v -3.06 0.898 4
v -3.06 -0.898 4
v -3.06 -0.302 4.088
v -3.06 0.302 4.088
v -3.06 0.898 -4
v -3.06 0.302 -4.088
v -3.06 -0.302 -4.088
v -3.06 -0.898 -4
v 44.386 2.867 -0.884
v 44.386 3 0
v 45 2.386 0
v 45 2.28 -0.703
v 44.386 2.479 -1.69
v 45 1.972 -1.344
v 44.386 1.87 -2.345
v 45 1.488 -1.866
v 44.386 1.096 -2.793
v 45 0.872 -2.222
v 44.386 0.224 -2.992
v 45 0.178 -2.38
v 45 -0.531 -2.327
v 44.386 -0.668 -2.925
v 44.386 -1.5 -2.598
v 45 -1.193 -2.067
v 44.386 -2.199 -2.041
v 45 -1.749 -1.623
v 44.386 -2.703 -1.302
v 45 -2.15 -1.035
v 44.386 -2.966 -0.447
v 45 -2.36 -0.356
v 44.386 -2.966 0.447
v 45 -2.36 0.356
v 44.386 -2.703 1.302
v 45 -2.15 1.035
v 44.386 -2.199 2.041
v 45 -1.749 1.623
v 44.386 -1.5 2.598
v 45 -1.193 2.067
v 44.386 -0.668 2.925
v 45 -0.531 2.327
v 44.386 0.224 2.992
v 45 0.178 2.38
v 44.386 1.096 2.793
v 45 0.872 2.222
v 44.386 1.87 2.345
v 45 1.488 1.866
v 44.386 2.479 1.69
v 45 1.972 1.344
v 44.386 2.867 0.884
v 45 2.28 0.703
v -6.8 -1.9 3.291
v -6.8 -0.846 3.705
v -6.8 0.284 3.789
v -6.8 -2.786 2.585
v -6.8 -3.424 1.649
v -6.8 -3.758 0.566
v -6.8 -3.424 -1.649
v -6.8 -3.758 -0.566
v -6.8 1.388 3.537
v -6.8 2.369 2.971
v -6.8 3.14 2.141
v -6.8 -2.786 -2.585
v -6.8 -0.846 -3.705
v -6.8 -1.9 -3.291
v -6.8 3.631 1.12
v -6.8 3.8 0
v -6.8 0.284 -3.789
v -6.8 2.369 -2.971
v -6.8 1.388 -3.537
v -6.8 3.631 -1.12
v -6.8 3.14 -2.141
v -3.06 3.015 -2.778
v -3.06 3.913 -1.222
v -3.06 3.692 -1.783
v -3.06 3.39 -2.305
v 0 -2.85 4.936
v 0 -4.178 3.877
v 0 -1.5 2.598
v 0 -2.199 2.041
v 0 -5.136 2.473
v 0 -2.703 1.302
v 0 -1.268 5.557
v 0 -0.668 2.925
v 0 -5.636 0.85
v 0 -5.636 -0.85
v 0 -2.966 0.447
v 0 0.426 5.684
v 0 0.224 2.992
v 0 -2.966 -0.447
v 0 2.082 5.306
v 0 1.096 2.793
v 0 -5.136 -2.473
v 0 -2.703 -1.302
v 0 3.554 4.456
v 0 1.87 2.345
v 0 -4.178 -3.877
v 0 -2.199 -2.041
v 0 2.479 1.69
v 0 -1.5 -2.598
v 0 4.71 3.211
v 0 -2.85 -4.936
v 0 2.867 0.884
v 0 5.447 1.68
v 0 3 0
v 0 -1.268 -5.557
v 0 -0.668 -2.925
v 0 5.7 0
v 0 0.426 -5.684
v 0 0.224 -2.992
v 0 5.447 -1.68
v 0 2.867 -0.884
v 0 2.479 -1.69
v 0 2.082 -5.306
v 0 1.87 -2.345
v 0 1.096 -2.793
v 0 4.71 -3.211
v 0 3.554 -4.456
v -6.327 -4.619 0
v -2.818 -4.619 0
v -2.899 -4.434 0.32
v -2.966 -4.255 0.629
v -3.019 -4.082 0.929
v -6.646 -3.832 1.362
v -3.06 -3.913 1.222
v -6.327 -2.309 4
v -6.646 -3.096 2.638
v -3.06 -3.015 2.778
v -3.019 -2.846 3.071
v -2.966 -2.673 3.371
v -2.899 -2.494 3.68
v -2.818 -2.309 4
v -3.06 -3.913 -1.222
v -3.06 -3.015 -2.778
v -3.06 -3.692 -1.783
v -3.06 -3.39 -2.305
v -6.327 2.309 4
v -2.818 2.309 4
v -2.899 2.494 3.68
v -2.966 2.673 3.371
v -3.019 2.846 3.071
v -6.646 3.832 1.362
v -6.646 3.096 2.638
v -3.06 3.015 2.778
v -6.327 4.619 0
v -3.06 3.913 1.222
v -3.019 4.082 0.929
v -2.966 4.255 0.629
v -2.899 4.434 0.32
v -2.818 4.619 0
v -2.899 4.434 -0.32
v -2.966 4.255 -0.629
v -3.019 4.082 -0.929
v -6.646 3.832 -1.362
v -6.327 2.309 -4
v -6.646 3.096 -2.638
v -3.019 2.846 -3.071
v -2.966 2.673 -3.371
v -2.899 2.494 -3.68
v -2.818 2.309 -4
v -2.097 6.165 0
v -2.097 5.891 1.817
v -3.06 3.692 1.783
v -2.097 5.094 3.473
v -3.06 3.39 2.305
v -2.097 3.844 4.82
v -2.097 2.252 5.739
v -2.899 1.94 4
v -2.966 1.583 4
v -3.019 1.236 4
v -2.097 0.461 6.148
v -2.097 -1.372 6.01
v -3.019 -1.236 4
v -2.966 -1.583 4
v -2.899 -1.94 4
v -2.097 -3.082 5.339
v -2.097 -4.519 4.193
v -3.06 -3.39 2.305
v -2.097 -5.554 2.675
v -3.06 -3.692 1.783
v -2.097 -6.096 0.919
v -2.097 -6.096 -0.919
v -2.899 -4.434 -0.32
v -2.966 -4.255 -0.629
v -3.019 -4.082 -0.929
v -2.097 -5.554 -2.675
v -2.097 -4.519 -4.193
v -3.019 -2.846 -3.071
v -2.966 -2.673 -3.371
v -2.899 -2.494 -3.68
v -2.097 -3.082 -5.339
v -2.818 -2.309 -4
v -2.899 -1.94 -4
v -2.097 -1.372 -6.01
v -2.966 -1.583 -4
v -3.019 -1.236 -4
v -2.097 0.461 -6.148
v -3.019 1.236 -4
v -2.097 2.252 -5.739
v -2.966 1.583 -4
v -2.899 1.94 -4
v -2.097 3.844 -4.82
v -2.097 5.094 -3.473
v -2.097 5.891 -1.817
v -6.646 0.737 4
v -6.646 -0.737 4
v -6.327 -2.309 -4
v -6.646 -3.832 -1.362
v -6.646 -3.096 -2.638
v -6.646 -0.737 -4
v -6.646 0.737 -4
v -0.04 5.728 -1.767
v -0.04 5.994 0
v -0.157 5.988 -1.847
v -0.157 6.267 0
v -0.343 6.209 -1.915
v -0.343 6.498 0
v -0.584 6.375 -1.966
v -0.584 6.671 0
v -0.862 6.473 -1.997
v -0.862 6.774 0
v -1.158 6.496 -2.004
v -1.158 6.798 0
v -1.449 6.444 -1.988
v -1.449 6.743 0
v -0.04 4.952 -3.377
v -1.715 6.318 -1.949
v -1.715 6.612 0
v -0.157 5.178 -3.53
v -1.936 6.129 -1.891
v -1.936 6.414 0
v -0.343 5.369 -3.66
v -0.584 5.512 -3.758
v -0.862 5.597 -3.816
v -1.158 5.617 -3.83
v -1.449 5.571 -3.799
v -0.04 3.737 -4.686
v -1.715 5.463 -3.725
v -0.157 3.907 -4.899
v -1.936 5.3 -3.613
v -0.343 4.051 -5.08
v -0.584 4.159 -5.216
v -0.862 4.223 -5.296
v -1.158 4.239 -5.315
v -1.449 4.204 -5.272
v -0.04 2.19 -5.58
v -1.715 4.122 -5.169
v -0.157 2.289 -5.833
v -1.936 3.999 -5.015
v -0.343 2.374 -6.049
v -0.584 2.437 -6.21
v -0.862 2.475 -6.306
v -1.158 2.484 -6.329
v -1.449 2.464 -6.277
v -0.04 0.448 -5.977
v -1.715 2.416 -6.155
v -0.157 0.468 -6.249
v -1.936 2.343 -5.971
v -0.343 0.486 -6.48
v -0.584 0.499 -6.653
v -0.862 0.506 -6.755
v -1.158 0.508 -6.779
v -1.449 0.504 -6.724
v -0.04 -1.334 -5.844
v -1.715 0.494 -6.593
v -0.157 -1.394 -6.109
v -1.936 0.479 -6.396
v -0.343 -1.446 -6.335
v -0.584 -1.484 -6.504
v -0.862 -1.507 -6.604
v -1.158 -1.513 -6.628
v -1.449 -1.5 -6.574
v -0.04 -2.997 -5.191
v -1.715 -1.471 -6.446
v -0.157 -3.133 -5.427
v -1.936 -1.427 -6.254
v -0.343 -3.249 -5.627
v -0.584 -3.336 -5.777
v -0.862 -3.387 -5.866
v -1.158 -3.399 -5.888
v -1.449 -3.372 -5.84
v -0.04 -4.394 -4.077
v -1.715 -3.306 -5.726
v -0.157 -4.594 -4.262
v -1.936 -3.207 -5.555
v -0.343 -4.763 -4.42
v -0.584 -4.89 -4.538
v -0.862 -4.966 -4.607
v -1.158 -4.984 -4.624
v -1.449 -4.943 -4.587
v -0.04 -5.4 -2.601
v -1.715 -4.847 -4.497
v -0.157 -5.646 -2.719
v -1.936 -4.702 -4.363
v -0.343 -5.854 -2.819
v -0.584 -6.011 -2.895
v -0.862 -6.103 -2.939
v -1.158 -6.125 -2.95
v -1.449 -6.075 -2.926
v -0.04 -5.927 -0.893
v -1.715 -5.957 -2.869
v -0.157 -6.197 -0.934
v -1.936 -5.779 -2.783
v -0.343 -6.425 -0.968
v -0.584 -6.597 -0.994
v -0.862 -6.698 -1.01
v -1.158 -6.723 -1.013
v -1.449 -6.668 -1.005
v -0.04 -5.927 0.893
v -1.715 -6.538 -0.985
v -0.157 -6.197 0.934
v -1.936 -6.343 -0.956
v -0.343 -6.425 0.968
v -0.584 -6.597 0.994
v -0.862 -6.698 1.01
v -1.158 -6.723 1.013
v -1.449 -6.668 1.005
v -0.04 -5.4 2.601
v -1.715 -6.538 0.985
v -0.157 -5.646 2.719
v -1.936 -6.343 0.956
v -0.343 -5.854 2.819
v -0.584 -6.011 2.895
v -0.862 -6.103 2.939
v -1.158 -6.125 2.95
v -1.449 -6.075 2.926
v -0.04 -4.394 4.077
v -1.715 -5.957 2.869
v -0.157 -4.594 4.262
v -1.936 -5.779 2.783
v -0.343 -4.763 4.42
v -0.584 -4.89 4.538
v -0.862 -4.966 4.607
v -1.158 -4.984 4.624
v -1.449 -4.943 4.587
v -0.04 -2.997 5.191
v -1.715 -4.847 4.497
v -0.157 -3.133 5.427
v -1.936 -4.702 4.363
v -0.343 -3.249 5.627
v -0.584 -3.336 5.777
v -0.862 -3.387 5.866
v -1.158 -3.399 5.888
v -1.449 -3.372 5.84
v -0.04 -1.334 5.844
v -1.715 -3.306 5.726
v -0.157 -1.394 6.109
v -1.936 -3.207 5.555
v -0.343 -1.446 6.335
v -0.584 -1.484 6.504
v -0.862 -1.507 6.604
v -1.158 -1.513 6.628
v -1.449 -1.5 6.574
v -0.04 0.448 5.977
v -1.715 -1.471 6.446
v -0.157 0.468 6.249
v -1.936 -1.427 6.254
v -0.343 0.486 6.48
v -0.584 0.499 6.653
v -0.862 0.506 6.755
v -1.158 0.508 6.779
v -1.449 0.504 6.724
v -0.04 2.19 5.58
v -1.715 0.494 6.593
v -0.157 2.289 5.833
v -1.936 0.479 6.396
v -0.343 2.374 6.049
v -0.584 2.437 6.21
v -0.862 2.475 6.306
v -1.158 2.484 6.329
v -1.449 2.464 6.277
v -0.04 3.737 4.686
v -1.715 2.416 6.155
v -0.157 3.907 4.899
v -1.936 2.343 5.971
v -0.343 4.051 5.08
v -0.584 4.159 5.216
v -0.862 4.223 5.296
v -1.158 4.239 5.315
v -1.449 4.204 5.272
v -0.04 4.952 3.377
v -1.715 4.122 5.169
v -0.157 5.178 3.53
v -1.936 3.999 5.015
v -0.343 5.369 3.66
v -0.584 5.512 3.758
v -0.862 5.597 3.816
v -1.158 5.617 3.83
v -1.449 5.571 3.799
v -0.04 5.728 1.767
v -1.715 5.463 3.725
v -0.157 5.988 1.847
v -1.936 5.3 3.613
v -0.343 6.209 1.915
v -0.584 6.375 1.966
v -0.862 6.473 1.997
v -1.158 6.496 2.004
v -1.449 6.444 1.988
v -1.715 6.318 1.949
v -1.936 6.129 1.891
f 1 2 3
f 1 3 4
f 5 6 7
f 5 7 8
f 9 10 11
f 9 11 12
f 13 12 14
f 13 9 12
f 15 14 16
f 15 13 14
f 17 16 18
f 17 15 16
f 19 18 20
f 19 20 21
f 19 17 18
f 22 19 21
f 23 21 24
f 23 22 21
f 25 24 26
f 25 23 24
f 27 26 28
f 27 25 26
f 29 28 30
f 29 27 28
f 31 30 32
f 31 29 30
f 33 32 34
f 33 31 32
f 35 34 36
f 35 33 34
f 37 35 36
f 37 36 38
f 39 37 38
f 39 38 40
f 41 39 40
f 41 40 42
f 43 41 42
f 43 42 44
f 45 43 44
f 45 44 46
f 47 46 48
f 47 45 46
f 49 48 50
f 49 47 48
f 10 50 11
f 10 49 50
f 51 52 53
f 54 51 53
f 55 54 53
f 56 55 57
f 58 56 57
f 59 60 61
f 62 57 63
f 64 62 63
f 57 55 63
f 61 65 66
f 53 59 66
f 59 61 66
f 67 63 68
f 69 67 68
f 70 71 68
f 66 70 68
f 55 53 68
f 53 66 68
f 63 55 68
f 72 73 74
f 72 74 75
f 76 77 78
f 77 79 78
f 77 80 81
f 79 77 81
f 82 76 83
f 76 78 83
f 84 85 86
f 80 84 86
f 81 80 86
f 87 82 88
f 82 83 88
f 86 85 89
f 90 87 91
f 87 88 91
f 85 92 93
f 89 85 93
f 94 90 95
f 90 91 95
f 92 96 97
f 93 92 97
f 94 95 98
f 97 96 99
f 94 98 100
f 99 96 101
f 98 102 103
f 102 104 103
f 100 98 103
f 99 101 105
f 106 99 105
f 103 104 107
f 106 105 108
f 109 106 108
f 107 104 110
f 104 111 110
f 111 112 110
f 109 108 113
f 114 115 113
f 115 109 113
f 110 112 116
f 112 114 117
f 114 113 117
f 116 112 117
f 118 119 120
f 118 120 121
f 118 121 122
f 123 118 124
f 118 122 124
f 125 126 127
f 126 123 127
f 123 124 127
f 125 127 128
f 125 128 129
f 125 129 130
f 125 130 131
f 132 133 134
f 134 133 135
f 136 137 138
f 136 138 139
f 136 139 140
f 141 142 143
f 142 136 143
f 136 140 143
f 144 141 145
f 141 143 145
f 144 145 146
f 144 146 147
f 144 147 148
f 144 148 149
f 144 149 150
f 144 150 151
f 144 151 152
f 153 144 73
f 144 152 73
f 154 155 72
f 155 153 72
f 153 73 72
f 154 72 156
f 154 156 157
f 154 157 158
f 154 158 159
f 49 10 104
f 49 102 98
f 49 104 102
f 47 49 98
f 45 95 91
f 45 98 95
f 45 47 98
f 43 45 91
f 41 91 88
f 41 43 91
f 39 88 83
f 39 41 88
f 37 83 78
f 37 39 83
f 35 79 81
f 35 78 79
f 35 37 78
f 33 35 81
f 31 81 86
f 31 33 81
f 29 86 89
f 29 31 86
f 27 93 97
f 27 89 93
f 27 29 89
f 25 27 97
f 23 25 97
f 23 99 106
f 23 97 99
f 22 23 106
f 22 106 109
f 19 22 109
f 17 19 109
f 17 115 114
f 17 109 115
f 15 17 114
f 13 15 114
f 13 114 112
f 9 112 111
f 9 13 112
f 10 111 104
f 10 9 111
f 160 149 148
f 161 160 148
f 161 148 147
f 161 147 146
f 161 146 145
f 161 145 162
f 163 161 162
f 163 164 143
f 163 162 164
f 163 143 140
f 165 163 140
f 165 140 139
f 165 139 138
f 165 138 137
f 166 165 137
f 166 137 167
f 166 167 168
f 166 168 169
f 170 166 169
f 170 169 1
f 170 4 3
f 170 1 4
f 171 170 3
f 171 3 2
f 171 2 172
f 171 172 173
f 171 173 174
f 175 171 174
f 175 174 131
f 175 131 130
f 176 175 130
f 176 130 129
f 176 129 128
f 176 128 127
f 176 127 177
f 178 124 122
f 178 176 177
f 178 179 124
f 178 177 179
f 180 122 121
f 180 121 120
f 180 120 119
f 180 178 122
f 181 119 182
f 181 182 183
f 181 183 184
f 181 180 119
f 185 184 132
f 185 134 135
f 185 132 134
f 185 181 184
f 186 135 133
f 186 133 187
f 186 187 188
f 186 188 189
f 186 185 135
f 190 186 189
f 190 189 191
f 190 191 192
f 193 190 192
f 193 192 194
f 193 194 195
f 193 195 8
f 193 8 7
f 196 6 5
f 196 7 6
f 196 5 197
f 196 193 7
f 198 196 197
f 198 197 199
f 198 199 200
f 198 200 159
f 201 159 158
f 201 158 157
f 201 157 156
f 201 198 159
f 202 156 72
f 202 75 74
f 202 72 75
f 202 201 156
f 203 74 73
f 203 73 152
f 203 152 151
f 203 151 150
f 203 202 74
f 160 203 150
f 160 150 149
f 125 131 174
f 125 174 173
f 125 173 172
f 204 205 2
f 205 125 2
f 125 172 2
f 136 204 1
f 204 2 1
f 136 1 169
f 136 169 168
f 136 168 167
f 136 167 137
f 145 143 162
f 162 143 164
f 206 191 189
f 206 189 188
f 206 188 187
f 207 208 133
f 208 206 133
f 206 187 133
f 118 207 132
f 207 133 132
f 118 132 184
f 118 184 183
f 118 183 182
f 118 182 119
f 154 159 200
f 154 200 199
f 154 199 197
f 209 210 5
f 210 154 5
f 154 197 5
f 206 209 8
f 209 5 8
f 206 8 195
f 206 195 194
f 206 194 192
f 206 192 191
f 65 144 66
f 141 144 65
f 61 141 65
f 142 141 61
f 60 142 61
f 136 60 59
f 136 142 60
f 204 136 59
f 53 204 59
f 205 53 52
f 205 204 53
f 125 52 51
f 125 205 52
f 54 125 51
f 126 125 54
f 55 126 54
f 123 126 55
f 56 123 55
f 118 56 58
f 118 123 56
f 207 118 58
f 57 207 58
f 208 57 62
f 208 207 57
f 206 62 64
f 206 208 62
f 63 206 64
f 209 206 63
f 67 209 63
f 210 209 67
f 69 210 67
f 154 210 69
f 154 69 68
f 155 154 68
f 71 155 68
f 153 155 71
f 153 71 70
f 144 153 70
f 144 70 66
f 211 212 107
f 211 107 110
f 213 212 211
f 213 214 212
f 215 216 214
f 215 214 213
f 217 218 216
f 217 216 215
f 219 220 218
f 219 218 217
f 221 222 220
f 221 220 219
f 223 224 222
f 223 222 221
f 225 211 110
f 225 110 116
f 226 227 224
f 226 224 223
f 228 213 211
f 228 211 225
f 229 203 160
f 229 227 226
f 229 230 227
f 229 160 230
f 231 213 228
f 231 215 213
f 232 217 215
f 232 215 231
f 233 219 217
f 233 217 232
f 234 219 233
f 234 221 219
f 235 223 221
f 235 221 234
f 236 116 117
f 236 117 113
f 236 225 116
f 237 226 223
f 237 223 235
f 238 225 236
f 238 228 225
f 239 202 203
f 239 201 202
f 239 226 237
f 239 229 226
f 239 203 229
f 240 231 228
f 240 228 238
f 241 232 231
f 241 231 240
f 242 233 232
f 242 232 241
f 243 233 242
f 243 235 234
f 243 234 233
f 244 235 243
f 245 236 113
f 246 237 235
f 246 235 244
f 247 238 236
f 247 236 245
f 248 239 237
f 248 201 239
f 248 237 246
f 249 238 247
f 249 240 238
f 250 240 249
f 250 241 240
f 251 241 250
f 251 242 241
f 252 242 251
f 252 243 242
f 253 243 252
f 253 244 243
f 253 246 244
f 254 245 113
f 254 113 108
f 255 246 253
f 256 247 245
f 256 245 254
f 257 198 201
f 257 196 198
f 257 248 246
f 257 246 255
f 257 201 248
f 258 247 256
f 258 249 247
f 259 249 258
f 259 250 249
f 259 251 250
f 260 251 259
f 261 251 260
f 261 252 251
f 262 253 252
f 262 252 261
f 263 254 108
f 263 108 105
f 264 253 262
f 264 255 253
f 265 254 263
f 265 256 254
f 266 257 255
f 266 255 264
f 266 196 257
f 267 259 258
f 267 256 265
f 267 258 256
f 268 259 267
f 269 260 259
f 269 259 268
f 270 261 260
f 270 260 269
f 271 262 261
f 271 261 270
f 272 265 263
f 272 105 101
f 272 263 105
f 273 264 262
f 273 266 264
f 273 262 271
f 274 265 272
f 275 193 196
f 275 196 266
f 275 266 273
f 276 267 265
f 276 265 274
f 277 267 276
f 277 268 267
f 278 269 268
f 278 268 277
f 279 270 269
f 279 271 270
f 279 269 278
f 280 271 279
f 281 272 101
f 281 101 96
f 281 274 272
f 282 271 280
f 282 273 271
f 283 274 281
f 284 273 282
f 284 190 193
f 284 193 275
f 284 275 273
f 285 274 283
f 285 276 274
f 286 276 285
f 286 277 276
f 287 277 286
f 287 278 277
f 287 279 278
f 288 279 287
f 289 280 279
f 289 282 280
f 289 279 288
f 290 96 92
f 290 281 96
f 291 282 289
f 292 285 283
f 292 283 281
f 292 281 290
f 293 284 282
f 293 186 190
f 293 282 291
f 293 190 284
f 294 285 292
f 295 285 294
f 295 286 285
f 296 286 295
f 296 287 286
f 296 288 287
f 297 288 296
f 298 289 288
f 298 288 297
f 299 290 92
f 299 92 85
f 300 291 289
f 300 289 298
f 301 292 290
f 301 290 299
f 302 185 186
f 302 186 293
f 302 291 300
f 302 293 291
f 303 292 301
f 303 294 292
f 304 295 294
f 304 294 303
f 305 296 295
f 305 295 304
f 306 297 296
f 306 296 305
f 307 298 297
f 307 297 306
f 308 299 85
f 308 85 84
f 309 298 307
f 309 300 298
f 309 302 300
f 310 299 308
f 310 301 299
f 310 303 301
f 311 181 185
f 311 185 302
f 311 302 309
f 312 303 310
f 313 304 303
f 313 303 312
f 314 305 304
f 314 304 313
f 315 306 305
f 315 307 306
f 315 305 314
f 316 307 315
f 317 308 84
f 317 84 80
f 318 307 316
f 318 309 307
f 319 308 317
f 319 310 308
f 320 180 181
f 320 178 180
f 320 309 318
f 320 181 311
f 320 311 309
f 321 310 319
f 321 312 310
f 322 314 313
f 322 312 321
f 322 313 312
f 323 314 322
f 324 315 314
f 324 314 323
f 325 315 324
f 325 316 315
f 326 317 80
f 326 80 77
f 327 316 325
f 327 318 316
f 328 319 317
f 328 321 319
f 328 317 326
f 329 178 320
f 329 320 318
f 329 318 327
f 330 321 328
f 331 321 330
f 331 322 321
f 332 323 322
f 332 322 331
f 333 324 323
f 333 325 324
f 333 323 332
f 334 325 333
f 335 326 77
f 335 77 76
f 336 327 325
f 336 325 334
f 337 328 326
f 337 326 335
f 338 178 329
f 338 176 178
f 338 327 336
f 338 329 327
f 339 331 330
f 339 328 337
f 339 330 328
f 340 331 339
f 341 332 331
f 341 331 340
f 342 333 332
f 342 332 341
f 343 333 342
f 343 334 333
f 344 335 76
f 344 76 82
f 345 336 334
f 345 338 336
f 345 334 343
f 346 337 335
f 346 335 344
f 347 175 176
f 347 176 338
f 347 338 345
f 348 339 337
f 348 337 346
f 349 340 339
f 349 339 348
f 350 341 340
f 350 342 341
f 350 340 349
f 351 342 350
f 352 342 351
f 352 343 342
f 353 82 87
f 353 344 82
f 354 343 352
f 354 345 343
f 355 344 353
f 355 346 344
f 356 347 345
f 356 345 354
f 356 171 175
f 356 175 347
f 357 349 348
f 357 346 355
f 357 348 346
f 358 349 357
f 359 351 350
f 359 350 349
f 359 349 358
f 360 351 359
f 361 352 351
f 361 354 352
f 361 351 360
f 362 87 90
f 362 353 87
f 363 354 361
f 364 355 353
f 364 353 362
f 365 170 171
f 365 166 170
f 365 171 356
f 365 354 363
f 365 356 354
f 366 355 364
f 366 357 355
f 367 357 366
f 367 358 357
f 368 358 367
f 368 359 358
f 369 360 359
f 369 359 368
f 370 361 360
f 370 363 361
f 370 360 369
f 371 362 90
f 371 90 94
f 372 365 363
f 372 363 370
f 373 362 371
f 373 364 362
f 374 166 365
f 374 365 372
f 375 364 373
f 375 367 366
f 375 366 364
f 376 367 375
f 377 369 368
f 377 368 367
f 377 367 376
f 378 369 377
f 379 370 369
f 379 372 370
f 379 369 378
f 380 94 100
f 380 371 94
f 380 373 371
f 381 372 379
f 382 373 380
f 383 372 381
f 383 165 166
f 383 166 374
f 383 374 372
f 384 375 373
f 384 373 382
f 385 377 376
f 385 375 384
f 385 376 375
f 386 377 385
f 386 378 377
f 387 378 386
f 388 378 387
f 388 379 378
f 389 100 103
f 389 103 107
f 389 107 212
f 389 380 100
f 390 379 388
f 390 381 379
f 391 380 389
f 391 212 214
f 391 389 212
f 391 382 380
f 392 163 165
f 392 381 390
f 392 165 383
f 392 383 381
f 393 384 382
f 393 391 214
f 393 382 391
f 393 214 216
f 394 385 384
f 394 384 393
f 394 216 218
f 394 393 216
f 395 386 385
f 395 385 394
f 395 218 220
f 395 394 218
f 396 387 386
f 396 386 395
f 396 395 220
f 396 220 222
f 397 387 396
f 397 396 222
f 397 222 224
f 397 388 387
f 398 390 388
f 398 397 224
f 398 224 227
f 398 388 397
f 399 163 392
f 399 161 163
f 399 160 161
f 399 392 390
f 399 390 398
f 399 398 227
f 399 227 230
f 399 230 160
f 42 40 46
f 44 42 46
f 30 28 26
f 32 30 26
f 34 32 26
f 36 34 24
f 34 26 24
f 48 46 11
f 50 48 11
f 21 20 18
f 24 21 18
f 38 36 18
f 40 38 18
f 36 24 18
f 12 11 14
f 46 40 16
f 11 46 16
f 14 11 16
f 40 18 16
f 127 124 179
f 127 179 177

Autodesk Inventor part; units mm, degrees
ref_plane "YZ Plane" through (0, 0, 0) normal (1, 0, 0) x (0, 1, 0)
ref_plane "XZ Plane" through (0, 0, 0) normal (0, 1, 0) x (-1, 0, 0)
sketch "Schizzo1" plane through (0, 0, 0) normal (0, 0, 1) x (1, 0, 0)
  line L0 (-3.06, 0) -> (-3.06, 4.0996)
  line L1 (0, 5.7) -> (0, 3)
  line L2 (27, 3) -> (45, 3)
  line L3 (45, 3) -> (45, 0)
  line L4 (45, 0) -> (-3.06, 0)
  arc A0 (0, 5.7) -> (-2.0969, 6.1649) centre (-1.1, 5.7) ccw
  line L5 (0, -1.4013) -> (0, 8.4076) projected
  line L6 (-12.672, 0) -> (54.612, 0) projected
  line L7 (0, 3) -> (0.0001, 3)
  line L8 (0.0001, 3) -> (0.0001, 3)
  line L9 (0.0001, 3) -> (26.3865, 3)
  line L10 (26.3865, 3) -> (27, 3)
  line L11 (-3.06, 4.0996) -> (-2.0969, 6.1649)
  line L12 (0.0001, 3) -> (27, 3) construction
  line L13 (27, 3) -> (27, 0) construction
  dimension "d0" = 1.1
  dimension "d1" = 45
  dimension "d2" = 18
  dimension "d3" = 13.6
  dimension "d4" = 6
  dimension "d5" = 3.06
  dimension "d15" = 6
  dimension "d16" = 6
  dimension "d17" = 0.0001
  dimension "d18" = 0.6135
  dimension "d19" = 25
revolve "Corpo" add sketch "Schizzo1" angle 360 about axis through (45, 0, 0) along (-1, 0, 0)
sketch "Schizzo2" plane through (0, 0, 0) normal (1, 0, 0) x (0, 0, -1)
  line L0 (4, 2.3094) -> (4, -2.3094)
  line L1 (4, -2.3094) -> (0, -4.6188)
  line L2 (0, -4.6188) -> (-4, -2.3094)
  line L3 (-4, -2.3094) -> (-4, 2.3094)
  line L4 (-4, 2.3094) -> (0, 4.6188)
  line L5 (0, 4.6188) -> (4, 2.3094)
  point P0 (0, 0)
  point P1 (0, 0)
  dimension "d23" = 8
extrude "Testa" add sketch "Schizzo2" against normal blind 6.8
sketch "Schizzo3" plane through (0, 0, 0) normal (0, 0, 1) x (1, 0, 0)
  line L0 (-6.8, 3.8) -> (-6.8, 4.6188)
  line L1 (-6.8, 4.6188) -> (-6.3273, 4.6188)
  line L2 (-6.3273, 4.6188) -> (-6.8, 3.8)
  line L3 (-7.5964, 0) -> (-2.0215, 0) projected
  line L4 (-6.8, 4.6188) -> (-6.8, 2.3094) projected
  line L5 (-2.8179, 4.6188) -> (-6.8, 4.6188) projected
  point P0 (-6.8, 2.3094)
  dimension "d8" = 30
  dimension "d22" = 7.6
revolve "Smusso1" cut sketch "Schizzo3" angle 360 about axis through (-10, 0, 0) along (1, 0, 0)
thread "Filettatura" size "M6x1" class "6g" standard "ISO Metric profile" length 18
chamfer "Smusso2" distance 0.6135 distance2 0.6135 1 edges at (45, -3, 0) measured on face at (45, 0.3546, -0.711)
ref_plane "Work Plane1" through (10.95, 0, 0) normal (0, 0, -1) x (1, 0, 0)
equation "\"d0\" = PHH"
equation "\"d1\" = NLG"
equation "\"d2\" = GEL"
equation "\"d3\" = LADI"
equation "\"d4\" = GD"
equation "\"d5\" = 0.45 * KOH"
equation "\"d15\" = SD2"
equation "\"d16\" = BDM"
equation "\"d18\" = GAL"
equation "\"d19\" = KEWI"
equation "\"d23\" = SW"
equation "\"d6\" = KOH"
equation "\"d8\" = ANG1"
equation "\"d22\" = SW0"
equation "\"d10\" = GEL"
equation "\"d13\" = -0.5 * SPD + 0.5 * GD"
equation "\"d14\" = GUL"
equation "\"NLG\" = 45"
equation "\"GD\" = NND"
equation "\"BDM\" = NND"
equation "\"KOH\" = 6.8"
equation "\"GEL\" = 18"
equation "\"LADI\" = 13.6"
equation "\"SW\" = 8"
equation "\"PHH\" = RR"
equation "\"SW0\" = 7.6"
equation "\"SPD\" = NND - 1.2269 * PTC"
equation "\"SD2\" = NND"
equation "\"SD\" = 0"
equation "\"ANG1\" = 30deg"
equation "\"KEWI\" = 25deg"
equation "\"GAL\" = 0.61345 * PTC"
equation "\"GUL\" = 0.61345 * PTC"
equation "\"PTC\" = 1"
equation "\"THREADDIA\" = 6"
equation "\"E0\" = 1.155 * SW"
equation "\"TOA\" = 30deg"
equation "\"NND\" = 6"
equation "\"GD1\" = THREADDIA - 1.2269 * PTC"
equation "\"SDH\" = SW"
equation "\"KOH1\" = 2.9"
equation "\"RR\" = 1.1"
properties part number "ISO 4162 - M6 x 45" material "Acciaio inossidabile"
